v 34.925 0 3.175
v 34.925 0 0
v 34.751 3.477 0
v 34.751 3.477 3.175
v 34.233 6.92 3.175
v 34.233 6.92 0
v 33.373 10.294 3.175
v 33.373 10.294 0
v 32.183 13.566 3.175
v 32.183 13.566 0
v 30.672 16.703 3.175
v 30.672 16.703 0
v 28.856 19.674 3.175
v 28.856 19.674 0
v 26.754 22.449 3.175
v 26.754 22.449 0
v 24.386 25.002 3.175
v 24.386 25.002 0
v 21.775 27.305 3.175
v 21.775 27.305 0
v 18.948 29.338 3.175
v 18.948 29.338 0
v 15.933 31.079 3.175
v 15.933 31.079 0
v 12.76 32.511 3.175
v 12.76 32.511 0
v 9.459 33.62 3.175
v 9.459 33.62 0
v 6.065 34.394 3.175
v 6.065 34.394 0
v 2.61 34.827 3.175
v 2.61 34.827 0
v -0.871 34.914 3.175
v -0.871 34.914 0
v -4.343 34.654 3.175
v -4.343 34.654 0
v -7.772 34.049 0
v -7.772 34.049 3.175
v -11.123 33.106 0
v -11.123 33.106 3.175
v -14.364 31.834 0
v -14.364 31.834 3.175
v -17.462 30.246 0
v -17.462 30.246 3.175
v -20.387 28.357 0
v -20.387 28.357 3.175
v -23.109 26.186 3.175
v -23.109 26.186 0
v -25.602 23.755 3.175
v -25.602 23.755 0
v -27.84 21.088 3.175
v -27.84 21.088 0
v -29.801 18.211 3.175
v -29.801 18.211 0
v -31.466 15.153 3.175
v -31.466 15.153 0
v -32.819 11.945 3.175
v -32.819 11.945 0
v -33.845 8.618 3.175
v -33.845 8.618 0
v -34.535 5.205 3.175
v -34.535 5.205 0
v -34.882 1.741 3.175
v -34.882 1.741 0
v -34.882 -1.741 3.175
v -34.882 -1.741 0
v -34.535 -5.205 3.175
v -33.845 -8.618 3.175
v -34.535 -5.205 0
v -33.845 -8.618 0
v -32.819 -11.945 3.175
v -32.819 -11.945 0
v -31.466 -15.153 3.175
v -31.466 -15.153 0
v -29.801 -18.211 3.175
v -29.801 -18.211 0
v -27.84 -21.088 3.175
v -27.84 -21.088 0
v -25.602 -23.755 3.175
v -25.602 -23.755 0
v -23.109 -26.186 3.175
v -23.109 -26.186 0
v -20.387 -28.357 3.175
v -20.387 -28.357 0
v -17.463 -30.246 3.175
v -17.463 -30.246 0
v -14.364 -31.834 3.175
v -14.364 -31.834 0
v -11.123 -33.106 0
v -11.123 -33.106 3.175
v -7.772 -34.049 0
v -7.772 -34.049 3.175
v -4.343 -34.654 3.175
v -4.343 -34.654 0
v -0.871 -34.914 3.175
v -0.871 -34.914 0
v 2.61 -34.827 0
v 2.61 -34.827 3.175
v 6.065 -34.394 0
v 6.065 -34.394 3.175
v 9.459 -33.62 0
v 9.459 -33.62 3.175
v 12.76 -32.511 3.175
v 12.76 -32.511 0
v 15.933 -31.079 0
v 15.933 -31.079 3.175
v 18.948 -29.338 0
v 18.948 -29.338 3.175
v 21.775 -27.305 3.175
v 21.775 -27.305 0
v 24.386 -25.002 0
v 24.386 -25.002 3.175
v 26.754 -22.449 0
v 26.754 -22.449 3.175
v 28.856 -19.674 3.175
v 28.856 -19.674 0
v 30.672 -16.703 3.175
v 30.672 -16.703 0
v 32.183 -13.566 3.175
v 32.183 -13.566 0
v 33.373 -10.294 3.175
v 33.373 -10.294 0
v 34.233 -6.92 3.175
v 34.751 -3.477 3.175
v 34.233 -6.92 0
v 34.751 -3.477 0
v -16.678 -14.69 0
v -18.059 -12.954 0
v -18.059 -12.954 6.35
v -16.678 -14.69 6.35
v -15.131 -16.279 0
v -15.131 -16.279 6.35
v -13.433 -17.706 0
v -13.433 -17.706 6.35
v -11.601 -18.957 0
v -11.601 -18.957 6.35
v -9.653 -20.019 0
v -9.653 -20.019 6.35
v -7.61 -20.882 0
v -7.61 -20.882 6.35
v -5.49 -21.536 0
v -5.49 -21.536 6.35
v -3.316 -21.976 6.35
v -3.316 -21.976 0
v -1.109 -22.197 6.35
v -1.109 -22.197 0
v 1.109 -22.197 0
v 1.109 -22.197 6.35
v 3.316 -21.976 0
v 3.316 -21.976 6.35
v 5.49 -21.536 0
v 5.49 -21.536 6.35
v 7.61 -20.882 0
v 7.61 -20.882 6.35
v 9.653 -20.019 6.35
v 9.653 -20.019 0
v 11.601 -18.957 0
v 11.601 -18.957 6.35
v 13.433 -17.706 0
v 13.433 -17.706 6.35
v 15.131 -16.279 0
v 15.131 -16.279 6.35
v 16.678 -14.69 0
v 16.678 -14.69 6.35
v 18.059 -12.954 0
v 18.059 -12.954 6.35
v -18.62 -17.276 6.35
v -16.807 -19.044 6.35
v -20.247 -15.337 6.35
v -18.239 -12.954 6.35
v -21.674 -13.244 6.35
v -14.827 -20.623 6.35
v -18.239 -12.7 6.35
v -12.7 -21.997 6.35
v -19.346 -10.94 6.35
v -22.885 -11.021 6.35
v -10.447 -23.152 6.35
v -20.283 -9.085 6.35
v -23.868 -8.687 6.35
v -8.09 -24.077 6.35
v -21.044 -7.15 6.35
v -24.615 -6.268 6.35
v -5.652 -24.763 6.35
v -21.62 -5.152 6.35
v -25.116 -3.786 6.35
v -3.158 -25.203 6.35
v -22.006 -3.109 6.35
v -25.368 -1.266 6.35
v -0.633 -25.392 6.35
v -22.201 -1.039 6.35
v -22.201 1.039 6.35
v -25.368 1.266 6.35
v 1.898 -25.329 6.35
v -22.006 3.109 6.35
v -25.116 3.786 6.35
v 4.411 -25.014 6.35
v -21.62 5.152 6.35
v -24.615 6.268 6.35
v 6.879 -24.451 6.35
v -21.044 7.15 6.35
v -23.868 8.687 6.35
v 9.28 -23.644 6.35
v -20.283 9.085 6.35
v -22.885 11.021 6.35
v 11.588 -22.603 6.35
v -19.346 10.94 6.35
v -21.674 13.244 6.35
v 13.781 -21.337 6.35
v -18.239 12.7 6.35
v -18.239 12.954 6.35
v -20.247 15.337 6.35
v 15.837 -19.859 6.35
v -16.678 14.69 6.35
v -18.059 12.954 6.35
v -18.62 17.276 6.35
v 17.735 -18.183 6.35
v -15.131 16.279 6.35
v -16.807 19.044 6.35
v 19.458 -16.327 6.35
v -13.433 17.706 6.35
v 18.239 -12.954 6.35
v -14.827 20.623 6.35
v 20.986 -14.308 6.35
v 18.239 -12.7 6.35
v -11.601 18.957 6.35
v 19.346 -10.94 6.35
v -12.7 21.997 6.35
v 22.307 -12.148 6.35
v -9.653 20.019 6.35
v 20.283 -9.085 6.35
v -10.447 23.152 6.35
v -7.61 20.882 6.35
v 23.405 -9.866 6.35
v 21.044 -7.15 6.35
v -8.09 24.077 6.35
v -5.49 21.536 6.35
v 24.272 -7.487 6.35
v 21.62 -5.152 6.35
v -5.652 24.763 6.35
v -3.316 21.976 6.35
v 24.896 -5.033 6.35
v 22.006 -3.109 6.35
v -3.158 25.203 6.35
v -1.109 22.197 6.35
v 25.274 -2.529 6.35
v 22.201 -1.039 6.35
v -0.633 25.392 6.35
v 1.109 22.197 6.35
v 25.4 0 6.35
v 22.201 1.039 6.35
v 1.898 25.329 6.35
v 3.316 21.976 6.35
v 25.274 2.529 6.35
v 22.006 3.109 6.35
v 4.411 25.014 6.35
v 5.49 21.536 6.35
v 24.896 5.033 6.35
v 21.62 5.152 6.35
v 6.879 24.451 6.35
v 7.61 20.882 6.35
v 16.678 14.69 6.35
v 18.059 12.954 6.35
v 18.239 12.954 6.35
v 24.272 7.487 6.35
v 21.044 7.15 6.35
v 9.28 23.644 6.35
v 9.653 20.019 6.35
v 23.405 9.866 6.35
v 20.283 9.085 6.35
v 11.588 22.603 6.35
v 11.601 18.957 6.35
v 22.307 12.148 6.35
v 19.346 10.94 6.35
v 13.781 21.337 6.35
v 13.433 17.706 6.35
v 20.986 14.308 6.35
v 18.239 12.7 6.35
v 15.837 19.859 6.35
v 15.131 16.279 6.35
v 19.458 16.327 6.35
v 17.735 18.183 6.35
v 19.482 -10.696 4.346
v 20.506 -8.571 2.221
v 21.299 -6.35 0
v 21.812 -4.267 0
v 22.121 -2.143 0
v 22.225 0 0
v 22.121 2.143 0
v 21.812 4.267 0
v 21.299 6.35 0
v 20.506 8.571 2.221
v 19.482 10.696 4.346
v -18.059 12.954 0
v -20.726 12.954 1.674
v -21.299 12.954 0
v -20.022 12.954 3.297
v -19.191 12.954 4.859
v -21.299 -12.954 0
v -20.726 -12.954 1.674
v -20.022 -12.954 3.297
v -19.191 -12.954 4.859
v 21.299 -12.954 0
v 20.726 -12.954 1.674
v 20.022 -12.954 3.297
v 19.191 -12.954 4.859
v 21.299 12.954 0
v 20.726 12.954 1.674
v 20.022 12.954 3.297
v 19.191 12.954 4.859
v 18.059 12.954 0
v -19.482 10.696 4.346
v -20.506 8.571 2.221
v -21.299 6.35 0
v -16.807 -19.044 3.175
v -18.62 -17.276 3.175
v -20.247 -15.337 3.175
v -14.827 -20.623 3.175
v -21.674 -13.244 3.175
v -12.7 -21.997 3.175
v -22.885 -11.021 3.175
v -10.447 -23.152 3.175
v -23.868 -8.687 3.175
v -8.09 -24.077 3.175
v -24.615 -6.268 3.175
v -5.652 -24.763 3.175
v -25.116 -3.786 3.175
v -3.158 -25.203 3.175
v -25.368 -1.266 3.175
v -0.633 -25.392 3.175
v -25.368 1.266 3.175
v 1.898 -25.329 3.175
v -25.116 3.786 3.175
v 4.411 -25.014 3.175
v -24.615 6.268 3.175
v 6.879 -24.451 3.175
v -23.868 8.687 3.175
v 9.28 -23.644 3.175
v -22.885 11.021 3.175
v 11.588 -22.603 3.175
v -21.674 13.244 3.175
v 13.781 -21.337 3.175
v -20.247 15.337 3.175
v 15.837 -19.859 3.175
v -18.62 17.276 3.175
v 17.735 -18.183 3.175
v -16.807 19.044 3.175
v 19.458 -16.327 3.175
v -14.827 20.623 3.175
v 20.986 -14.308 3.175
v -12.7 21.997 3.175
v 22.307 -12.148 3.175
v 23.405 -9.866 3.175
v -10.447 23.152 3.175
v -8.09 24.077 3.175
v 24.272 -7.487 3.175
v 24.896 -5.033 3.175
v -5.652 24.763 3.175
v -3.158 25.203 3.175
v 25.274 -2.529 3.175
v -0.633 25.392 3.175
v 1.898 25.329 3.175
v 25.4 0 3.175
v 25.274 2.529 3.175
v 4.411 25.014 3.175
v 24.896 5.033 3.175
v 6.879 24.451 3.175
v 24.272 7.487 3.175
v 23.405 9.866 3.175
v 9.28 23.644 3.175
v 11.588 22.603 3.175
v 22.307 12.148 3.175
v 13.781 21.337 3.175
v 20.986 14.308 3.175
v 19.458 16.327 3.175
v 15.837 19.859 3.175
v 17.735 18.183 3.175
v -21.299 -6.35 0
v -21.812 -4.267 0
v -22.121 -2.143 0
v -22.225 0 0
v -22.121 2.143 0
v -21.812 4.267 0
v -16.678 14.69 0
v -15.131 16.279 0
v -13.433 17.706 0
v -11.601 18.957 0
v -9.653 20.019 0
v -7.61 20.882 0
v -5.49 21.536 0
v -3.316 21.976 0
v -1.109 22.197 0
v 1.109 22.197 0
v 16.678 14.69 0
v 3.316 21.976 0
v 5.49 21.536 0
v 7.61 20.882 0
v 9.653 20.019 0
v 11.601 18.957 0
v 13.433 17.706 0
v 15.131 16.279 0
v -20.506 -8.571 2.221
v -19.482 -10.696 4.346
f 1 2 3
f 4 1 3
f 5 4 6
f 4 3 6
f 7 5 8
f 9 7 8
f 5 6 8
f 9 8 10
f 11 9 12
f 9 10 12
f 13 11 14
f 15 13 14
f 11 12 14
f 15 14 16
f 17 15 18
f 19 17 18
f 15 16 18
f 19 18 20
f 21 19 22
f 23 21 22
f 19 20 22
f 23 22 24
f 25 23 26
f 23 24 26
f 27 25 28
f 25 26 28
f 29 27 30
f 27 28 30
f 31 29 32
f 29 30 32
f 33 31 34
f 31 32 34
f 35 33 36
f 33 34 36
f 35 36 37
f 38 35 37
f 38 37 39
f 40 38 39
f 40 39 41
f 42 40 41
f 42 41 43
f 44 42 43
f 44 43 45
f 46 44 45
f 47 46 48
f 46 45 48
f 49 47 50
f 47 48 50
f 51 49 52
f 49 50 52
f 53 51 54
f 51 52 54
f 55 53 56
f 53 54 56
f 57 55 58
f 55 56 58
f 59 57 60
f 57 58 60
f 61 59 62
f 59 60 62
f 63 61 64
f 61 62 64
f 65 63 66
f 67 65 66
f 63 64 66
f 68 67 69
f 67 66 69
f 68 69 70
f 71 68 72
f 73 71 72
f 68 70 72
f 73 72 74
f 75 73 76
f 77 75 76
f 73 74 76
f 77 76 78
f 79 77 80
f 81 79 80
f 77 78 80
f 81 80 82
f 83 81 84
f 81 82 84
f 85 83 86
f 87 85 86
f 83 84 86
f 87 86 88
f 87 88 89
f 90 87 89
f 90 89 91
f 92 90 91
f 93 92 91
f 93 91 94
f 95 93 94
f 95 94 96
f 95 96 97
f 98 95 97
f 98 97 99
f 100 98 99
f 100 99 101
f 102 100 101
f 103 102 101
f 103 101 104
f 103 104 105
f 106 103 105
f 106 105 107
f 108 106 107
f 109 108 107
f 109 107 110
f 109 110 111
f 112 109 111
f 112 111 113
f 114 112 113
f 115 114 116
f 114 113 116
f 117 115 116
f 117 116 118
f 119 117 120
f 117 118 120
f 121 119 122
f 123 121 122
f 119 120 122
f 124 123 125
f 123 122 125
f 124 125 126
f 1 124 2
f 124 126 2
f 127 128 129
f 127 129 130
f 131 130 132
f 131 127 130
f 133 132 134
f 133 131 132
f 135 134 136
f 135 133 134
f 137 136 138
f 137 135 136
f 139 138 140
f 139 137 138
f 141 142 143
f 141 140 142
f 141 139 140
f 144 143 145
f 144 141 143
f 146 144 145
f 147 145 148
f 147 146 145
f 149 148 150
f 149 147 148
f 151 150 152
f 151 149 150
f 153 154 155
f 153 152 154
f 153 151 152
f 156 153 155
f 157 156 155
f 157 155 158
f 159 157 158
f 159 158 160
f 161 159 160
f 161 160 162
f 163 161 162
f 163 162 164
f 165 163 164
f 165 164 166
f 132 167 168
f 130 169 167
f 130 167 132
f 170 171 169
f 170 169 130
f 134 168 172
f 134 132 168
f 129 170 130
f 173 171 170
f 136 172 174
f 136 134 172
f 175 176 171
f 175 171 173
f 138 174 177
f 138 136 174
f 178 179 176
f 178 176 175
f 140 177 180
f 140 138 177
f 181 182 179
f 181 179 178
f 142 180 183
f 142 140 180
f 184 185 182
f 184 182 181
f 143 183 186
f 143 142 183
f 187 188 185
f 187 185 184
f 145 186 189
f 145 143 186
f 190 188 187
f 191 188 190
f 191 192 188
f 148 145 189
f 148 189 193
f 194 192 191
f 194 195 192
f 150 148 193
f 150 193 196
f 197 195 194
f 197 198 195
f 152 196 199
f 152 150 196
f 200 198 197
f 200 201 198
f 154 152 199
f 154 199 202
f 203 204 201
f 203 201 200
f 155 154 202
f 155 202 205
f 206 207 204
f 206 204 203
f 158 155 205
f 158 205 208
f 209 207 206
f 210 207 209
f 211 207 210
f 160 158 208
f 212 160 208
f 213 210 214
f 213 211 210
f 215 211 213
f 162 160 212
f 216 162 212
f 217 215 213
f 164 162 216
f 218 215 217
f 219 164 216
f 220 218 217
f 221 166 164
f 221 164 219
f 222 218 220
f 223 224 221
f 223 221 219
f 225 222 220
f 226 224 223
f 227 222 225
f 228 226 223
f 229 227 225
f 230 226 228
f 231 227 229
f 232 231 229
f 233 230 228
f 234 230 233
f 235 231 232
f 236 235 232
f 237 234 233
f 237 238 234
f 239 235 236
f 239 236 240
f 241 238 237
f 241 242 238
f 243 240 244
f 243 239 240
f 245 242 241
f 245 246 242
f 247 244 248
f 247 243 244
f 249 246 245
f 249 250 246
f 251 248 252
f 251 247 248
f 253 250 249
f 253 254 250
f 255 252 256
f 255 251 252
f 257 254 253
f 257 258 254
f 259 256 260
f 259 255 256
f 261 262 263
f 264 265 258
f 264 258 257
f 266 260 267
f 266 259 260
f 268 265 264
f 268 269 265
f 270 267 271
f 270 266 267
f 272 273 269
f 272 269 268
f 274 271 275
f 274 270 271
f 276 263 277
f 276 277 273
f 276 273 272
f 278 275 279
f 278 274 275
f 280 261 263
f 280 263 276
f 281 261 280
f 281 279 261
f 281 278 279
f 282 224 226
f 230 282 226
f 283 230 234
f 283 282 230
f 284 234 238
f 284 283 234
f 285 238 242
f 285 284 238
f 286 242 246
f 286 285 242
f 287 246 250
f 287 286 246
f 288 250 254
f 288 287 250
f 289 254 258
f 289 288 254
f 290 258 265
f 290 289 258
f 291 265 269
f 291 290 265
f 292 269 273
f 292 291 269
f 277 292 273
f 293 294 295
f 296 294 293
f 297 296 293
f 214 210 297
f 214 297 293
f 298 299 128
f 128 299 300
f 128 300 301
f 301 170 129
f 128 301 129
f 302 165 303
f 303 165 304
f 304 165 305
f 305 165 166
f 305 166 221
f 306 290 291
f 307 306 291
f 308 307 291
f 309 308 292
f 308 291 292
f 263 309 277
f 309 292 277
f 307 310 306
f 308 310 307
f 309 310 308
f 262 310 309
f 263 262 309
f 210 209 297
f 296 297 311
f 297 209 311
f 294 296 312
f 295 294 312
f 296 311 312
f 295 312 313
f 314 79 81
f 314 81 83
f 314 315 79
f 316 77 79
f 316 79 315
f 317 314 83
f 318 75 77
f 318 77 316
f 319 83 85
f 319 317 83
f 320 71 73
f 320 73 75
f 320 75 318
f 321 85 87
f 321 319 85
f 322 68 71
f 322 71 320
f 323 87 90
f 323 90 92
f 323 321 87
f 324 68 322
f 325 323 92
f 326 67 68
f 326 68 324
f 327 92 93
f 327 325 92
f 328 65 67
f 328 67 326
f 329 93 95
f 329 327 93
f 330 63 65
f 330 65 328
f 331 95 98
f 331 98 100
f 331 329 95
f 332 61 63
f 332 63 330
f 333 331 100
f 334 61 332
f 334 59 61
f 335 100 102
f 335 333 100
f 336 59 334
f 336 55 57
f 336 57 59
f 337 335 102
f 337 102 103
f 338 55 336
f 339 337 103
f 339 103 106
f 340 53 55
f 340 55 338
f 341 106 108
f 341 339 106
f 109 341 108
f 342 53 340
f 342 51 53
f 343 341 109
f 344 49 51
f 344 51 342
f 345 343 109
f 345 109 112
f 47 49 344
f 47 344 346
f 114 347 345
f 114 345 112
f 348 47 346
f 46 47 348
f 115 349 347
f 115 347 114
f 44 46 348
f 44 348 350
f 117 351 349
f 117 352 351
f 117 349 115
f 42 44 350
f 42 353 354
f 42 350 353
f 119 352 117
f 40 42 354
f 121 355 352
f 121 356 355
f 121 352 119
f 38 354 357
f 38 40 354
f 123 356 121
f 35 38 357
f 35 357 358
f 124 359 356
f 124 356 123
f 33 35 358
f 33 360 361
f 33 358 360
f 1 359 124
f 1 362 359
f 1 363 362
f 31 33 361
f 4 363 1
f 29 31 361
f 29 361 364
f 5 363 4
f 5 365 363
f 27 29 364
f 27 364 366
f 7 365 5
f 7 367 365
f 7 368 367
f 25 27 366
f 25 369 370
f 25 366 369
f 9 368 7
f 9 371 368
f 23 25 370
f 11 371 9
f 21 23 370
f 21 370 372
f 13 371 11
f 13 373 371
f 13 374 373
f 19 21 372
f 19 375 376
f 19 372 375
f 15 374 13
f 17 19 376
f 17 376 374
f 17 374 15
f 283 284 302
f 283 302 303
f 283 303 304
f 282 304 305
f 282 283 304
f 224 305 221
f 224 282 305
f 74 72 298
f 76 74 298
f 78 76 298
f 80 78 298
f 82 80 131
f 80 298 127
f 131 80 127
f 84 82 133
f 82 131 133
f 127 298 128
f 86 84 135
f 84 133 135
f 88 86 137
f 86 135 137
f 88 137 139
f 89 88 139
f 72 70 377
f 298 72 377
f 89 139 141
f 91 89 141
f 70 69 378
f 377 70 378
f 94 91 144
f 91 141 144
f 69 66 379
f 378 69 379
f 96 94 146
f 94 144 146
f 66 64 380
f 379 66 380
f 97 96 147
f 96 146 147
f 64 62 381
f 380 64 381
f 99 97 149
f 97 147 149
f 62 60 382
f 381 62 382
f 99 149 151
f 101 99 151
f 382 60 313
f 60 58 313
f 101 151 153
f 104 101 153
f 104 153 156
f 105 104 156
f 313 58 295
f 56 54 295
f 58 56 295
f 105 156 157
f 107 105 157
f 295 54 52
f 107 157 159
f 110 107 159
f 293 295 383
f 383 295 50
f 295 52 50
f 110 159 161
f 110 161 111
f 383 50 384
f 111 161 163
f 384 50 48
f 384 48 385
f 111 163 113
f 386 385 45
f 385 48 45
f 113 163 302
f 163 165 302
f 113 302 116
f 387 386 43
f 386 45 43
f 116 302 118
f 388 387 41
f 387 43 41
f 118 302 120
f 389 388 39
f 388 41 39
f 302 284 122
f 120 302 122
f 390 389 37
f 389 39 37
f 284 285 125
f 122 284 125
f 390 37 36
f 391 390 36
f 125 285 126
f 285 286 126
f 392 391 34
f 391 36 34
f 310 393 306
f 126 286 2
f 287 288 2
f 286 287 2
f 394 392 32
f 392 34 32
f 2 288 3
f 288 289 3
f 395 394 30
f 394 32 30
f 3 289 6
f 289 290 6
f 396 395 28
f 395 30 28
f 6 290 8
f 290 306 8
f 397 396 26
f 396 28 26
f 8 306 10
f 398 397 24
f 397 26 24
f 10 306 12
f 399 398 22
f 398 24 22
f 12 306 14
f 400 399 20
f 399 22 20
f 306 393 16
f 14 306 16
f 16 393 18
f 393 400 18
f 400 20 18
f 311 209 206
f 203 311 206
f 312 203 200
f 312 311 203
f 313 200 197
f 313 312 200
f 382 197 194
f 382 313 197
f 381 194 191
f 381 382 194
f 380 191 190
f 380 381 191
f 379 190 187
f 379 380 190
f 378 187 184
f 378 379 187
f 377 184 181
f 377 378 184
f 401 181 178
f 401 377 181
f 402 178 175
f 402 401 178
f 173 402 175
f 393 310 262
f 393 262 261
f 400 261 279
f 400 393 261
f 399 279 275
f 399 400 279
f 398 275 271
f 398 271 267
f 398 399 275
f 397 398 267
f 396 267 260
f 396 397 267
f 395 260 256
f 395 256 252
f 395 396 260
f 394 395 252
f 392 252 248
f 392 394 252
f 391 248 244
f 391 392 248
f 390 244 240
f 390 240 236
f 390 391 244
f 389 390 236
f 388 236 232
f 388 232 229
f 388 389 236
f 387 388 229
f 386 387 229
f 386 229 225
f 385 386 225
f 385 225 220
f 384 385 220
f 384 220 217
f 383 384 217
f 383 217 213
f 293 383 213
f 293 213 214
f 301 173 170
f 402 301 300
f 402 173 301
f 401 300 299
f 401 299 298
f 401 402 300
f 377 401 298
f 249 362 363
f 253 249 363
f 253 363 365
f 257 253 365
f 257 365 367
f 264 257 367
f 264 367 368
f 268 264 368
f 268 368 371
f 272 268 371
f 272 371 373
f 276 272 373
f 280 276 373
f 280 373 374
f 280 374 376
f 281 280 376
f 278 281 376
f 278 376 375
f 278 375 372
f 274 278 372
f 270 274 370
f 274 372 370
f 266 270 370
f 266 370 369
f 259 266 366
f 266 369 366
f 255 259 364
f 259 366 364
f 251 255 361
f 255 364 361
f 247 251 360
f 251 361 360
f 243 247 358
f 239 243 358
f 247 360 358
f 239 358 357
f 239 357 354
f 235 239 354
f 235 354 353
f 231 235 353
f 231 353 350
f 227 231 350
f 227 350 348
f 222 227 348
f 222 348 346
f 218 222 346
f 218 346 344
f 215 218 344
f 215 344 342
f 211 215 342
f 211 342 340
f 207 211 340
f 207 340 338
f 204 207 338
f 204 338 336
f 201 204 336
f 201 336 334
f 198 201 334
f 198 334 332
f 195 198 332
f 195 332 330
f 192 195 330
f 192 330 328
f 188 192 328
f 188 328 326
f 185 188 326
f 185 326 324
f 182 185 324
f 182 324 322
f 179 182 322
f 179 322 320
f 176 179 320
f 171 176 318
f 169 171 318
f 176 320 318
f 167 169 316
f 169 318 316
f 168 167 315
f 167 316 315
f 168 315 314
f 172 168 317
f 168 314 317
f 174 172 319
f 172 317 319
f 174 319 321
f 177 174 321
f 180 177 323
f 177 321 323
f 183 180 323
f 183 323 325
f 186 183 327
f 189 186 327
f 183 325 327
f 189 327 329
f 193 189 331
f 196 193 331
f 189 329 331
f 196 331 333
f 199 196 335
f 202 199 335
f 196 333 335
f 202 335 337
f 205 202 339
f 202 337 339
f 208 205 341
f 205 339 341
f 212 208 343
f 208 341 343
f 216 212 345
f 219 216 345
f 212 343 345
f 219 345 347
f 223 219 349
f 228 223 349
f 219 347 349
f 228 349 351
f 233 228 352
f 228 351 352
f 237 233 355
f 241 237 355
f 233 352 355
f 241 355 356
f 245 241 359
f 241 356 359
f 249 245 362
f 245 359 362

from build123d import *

# Parameters (mm, degrees)
F0_R          = 34.925
F0_R_2        = 25.4
F1_DEPTH      = 3.175
F0_R_3        = 22.225
F2_DEPTH      = 6.35
F3_R          = 22.225
F4_DEPTH      = 12.954
F4_DEPTH_BACK = 12.954


with BuildPart() as f1:
    # F0 (on Top) → F1 (new body)
    with BuildSketch(Plane.XY):
        Circle(F0_R)
        Circle(F0_R_2, mode=Mode.SUBTRACT)
    extrude(amount=F1_DEPTH)

    # F0 (on Top) → F2 (join)
    with BuildSketch(Plane.XY):
        Circle(F0_R_2)
        Circle(F0_R_3, mode=Mode.SUBTRACT)
    extrude(amount=F2_DEPTH)

    # F3 (on Front) → F4 (cut, two sides)
    with BuildSketch(Plane.XZ) as f4_sk:
        with Locations((0, -6.35)):
            Circle(F3_R)
    extrude(amount=-F4_DEPTH, mode=Mode.SUBTRACT)
    extrude(f4_sk.sketch, amount=F4_DEPTH_BACK, mode=Mode.SUBTRACT)


solid = f1.part
